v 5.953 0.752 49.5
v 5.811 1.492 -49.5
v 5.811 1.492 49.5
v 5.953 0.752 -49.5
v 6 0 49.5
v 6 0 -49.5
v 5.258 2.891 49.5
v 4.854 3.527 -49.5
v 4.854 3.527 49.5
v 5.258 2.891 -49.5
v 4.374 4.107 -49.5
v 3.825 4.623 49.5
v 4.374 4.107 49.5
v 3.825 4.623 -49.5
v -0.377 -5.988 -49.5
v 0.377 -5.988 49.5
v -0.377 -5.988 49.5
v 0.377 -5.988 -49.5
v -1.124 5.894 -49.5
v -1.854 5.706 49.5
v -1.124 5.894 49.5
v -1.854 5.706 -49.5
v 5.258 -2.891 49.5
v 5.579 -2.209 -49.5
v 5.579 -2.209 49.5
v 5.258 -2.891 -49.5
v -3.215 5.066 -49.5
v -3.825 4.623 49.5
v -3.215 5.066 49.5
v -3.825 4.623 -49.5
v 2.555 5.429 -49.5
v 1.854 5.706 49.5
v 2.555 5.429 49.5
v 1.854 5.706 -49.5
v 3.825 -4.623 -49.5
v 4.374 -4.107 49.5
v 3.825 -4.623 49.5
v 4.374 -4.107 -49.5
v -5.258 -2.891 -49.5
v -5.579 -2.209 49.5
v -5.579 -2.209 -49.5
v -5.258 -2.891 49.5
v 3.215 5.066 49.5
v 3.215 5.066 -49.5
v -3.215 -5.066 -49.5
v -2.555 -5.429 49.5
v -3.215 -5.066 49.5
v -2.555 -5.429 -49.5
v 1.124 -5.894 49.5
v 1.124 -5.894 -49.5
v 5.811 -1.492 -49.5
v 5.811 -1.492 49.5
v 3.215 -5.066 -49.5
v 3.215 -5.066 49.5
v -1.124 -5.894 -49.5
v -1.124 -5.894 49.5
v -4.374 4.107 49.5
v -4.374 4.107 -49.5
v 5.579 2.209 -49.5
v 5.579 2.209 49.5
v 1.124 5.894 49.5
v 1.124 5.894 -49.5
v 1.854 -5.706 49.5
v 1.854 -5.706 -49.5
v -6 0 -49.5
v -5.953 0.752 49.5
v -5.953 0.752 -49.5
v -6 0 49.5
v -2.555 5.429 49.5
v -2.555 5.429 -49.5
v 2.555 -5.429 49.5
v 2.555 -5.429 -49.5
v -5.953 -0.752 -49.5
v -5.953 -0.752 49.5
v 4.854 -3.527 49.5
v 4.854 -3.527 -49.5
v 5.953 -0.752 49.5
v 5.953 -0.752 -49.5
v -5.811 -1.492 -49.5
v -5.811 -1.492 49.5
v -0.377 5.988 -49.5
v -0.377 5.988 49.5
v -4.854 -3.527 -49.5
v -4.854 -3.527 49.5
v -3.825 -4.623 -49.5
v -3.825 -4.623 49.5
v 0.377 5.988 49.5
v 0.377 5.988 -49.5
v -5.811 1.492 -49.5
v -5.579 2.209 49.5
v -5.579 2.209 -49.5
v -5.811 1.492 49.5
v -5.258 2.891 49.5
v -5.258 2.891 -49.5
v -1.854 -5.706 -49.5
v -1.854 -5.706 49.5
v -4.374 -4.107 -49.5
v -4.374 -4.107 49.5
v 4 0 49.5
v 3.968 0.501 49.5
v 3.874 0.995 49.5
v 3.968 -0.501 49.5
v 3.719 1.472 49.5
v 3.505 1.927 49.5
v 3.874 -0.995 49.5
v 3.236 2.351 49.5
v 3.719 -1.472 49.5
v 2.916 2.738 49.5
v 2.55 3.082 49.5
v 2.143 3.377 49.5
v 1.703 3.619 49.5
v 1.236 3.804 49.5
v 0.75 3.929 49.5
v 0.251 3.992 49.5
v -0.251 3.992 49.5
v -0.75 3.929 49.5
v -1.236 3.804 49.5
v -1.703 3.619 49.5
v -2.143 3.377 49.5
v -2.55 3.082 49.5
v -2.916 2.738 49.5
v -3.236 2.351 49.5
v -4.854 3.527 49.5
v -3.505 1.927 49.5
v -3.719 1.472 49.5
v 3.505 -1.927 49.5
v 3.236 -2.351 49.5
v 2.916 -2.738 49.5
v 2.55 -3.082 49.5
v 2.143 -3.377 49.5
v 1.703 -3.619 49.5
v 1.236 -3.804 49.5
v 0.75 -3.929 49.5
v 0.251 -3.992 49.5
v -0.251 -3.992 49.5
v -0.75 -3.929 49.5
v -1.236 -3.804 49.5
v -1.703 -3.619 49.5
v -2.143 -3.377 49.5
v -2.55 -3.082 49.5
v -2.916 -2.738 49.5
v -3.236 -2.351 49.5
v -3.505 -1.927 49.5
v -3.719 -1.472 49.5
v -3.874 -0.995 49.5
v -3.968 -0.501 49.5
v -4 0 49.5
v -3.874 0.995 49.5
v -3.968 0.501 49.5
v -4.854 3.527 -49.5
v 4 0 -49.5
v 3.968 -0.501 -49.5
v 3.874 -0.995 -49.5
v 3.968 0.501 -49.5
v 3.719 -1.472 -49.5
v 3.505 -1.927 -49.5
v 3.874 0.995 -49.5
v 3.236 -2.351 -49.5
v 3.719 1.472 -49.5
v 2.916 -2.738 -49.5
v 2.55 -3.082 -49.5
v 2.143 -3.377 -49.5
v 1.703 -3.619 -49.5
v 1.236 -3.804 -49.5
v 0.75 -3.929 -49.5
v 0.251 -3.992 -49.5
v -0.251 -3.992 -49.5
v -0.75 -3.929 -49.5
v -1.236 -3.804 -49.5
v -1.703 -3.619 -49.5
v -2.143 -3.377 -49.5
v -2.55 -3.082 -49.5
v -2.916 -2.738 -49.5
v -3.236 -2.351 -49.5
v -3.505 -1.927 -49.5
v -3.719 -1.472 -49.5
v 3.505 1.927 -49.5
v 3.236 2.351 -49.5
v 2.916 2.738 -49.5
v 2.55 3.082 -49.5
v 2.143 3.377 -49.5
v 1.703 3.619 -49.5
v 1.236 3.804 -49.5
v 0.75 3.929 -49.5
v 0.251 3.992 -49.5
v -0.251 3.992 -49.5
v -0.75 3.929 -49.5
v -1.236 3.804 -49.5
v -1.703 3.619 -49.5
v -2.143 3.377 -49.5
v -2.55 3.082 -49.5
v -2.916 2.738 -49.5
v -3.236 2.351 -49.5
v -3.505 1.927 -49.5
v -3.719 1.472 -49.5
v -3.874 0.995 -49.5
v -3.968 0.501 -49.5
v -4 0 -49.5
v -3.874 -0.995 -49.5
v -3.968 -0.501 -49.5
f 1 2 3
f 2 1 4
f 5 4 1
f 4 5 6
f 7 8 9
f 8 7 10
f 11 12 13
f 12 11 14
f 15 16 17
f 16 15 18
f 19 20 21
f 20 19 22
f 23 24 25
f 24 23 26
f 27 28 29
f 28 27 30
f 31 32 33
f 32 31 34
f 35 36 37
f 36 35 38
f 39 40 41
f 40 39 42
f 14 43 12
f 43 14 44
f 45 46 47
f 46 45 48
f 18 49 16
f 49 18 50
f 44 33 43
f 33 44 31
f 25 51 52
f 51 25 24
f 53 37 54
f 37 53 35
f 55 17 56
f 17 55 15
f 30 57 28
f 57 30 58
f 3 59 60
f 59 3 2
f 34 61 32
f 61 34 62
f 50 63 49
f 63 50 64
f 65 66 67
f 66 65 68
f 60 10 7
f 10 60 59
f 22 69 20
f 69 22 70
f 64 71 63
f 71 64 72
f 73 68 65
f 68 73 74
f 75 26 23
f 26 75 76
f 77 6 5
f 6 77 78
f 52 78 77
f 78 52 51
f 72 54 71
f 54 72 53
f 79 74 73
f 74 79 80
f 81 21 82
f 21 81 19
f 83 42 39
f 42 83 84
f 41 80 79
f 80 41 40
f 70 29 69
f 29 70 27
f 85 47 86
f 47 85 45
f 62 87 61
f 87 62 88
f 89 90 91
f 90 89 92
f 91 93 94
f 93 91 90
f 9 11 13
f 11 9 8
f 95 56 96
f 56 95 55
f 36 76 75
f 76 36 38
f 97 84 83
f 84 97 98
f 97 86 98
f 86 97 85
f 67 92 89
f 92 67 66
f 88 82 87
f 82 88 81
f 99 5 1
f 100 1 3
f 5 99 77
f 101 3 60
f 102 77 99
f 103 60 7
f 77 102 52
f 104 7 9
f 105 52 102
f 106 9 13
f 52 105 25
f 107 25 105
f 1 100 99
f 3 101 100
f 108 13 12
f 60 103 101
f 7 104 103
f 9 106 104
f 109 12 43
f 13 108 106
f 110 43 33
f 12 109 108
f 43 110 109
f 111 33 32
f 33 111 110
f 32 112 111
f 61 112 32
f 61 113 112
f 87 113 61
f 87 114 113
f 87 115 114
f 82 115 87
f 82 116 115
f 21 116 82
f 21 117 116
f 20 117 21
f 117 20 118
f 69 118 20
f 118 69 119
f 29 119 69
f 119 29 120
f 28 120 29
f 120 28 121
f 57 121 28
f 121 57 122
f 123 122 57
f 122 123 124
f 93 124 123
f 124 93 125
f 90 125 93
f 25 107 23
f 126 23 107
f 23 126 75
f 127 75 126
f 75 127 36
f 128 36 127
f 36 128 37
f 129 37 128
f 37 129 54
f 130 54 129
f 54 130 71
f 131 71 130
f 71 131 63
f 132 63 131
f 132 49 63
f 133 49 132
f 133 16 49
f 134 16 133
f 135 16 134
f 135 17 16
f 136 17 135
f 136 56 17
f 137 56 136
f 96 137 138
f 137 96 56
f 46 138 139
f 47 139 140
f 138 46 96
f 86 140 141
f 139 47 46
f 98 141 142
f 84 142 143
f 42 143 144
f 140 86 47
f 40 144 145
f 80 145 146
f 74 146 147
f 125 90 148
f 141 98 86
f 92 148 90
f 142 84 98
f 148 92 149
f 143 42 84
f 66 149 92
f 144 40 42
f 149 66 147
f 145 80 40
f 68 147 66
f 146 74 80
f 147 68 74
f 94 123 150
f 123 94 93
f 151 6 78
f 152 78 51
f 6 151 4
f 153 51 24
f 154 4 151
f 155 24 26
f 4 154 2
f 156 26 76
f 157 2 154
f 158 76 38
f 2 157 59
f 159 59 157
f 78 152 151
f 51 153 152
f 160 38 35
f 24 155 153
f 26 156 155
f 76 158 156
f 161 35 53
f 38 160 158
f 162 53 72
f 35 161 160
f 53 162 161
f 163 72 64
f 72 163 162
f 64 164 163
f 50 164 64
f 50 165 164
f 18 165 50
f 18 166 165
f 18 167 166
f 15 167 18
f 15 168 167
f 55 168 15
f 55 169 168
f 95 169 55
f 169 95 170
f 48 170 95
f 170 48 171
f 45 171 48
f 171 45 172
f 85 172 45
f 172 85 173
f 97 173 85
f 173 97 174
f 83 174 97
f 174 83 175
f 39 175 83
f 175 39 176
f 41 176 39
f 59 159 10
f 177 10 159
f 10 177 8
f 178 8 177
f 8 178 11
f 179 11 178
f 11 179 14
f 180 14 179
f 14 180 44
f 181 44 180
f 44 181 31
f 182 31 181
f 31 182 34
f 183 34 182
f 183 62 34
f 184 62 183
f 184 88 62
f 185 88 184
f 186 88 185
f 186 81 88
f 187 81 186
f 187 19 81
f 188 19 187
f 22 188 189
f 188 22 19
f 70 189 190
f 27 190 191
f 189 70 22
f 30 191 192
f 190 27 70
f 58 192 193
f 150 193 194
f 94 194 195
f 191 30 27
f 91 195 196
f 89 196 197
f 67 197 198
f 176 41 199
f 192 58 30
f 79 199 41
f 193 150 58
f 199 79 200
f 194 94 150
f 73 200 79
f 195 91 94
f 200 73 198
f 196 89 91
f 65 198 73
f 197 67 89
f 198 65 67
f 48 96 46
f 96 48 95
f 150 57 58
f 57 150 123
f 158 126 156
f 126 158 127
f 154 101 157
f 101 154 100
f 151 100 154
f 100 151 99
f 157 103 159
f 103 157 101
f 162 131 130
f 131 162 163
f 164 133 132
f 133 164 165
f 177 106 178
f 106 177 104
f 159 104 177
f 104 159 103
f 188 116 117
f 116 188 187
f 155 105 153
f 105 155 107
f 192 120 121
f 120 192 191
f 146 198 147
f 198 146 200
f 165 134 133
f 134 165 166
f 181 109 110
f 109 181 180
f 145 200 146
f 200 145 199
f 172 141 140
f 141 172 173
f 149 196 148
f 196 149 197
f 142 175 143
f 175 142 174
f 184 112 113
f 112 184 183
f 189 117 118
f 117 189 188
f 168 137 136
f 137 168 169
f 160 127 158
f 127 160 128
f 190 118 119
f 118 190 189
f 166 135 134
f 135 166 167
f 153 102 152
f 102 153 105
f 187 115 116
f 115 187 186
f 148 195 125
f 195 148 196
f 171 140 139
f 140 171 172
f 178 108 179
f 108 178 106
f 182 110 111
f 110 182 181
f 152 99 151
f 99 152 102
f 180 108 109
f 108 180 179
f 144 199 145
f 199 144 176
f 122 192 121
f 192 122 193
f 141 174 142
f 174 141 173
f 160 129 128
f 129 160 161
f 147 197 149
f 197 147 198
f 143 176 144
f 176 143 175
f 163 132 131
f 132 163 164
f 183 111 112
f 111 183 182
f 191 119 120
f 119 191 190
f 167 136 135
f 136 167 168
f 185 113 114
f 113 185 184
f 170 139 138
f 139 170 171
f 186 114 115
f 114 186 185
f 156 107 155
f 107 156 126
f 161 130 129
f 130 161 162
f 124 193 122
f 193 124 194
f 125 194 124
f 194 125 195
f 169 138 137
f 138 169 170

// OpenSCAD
$fn = 50;


difference() {
	union() {
		translate(v = [0, 0, -49.5000000000]) {
			cylinder(h = 99, r = 6.0000000000);
		}
	}
	union() {
		translate(v = [0, 0, -100.0000000000]) {
			cylinder(h = 200, r = 4.0000000000);
		}
	}
}
